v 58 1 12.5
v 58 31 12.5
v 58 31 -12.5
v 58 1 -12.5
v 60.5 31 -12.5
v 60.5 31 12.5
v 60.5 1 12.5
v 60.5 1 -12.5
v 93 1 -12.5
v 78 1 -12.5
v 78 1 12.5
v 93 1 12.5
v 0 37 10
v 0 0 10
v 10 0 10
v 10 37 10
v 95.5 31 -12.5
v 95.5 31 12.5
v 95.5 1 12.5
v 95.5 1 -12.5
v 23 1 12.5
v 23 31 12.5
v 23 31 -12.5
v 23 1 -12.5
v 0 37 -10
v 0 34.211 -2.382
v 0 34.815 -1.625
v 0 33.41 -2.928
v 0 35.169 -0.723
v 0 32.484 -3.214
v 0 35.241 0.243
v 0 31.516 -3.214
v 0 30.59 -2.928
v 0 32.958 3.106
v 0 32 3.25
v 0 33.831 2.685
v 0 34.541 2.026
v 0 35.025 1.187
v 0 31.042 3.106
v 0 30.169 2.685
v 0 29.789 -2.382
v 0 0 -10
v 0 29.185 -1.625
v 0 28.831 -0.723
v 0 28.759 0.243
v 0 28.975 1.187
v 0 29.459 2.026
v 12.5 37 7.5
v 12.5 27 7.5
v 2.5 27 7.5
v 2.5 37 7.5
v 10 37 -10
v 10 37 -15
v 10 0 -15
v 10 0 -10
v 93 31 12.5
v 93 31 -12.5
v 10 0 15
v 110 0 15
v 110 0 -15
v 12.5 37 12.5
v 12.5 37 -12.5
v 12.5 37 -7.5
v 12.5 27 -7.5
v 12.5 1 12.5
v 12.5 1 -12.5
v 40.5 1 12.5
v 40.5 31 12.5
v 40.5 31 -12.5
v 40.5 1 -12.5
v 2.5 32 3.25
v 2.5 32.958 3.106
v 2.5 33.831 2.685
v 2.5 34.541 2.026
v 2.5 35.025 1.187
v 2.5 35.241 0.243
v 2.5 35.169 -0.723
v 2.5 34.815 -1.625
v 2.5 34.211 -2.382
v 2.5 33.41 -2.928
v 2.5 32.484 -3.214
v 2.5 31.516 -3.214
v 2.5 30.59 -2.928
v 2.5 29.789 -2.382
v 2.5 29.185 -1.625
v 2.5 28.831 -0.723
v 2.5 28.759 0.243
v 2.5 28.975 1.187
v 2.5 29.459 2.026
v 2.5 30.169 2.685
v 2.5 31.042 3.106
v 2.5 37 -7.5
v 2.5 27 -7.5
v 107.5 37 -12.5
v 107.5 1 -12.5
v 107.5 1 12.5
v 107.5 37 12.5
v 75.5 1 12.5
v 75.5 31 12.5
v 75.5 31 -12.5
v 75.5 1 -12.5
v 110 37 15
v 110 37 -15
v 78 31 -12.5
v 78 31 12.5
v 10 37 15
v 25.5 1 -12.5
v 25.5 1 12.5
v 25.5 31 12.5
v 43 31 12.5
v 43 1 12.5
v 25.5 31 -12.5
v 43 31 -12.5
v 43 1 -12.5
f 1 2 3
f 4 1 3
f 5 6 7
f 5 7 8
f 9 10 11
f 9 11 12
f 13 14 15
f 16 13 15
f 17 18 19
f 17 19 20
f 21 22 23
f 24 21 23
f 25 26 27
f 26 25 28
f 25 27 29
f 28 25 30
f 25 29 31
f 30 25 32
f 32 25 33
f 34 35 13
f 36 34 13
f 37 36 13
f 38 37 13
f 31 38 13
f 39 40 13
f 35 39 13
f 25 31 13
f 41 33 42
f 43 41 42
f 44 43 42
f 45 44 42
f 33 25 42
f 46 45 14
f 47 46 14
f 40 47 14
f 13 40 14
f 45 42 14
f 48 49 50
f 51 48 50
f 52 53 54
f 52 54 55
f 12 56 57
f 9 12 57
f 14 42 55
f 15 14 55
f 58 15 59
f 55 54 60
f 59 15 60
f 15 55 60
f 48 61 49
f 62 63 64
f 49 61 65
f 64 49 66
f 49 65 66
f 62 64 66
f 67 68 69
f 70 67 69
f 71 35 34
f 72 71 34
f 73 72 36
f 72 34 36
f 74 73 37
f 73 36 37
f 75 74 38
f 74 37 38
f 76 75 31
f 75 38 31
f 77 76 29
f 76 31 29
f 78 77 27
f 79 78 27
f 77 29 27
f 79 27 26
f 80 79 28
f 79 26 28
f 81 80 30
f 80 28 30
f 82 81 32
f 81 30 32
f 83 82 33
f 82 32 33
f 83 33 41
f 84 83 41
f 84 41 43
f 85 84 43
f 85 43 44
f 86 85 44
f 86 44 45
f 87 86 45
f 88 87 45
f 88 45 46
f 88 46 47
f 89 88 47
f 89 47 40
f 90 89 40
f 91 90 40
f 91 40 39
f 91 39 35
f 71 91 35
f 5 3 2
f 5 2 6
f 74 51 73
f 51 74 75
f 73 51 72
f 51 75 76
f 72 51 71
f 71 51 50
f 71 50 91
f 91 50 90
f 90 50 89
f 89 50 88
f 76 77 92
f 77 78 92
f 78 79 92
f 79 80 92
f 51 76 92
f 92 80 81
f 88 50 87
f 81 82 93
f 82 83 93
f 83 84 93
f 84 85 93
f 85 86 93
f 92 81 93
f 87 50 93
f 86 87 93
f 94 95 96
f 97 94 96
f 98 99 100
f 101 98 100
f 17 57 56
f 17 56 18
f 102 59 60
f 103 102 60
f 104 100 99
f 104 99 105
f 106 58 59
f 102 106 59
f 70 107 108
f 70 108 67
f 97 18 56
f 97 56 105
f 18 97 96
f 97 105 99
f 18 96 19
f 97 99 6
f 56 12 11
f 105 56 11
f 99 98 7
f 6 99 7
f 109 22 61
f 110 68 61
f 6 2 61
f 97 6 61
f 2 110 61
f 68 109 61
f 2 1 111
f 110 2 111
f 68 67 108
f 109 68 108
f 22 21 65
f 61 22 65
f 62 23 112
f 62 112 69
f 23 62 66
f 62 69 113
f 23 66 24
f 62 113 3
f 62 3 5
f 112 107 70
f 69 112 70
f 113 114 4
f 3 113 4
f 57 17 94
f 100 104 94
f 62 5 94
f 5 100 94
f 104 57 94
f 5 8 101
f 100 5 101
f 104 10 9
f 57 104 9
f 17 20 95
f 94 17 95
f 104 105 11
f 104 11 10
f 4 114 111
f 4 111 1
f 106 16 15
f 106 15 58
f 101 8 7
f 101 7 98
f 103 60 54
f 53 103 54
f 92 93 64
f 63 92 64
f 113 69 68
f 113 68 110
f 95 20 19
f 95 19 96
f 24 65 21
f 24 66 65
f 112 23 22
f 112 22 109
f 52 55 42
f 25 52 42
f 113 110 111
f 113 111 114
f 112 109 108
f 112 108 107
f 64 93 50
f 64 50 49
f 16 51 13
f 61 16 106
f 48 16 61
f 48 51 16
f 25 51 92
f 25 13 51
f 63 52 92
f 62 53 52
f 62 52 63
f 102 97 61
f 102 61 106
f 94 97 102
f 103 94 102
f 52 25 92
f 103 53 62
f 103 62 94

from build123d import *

# Parameters (mm, degrees)
EXTRUDE_2_DEPTH     = 1
EXTRUDE_3_DEPTH     = 37
SKETCH_3_W          = 2.5
SKETCH_3_H          = 25
EXTRUDE_4_DEPTH     = 30
SKETCH_4_W          = 10
SKETCH_4_H          = 15
EXTRUDE_5_DEPTH     = 26
CUT_EXTRUDE_1_REACH = 119.021
SKETCH_5_R          = 3.25


with BuildPart() as part:
    # 草图2 → 凸台-拉伸2 (new body)
    with BuildSketch(Plane(origin=(0, 0, 0), x_dir=(1, 0, 0), z_dir=(0, 1, 0))):
        Polygon((110, 15), (10, 15), (10, 10), (0, 10), (0, -10), (10, -10), (10, -15), (110, -15), align=None)
    extrude(amount=EXTRUDE_2_DEPTH)

    # 草图2<3> → 凸台-拉伸3 (add)
    with BuildSketch(Plane(origin=(0, 0, 0), x_dir=(1, 0, 0), z_dir=(0, 1, 0))):
        Polygon((10, 15), (10, 10), (0, 10), (0, -10), (10, -10), (10, -15), (110, -15), (110, 15), align=None)
        Polygon((12.5, 12.5), (107.5, 12.5), (107.5, -12.5), (12.5, -12.5), (12.5, -7.5), (2.5, -7.5), (2.5, 7.5), (12.5, 7.5), align=None, mode=Mode.SUBTRACT)
    extrude(amount=EXTRUDE_3_DEPTH)

    # 草图3 → 凸台-拉伸4 (add)
    with BuildSketch(Plane(origin=(0, 1, 0), x_dir=(1, 0, 0), z_dir=(0, 1, 0))):
        with Locations((24.25, 0)):
            Rectangle(SKETCH_3_W, SKETCH_3_H)
        with Locations((41.75, 0)):
            Rectangle(SKETCH_3_W, SKETCH_3_H)
        with Locations((59.25, 0)):
            Rectangle(SKETCH_3_W, SKETCH_3_H)
        with Locations((76.75, 0)):
            Rectangle(SKETCH_3_W, SKETCH_3_H)
        with Locations((94.25, 0)):
            Rectangle(SKETCH_3_W, SKETCH_3_H)
    extrude(amount=EXTRUDE_4_DEPTH)

    # 草图4 → 凸台-拉伸5 (add)
    with BuildSketch(Plane(origin=(0, 1, 0), x_dir=(1, 0, 0), z_dir=(0, 1, 0))):
        with Locations((7.5, 0)):
            Rectangle(SKETCH_4_W, SKETCH_4_H)
    extrude(amount=EXTRUDE_5_DEPTH)

    # 草图5 → 切除-拉伸1 (cut, up to next)
    with BuildSketch(Plane.ZY, mode=Mode.PRIVATE) as cut_extrude_1_sk1:
        with Locations((0, 32)):
            Circle(SKETCH_5_R)
    cut_extrude_1_tool1 = extrude(cut_extrude_1_sk1.sketch, amount=-CUT_EXTRUDE_1_REACH, mode=Mode.PRIVATE) & part.part
    add(cut_extrude_1_tool1.solids().sort_by_distance((0, 32, 0))[0], mode=Mode.SUBTRACT)


solid = part.part
